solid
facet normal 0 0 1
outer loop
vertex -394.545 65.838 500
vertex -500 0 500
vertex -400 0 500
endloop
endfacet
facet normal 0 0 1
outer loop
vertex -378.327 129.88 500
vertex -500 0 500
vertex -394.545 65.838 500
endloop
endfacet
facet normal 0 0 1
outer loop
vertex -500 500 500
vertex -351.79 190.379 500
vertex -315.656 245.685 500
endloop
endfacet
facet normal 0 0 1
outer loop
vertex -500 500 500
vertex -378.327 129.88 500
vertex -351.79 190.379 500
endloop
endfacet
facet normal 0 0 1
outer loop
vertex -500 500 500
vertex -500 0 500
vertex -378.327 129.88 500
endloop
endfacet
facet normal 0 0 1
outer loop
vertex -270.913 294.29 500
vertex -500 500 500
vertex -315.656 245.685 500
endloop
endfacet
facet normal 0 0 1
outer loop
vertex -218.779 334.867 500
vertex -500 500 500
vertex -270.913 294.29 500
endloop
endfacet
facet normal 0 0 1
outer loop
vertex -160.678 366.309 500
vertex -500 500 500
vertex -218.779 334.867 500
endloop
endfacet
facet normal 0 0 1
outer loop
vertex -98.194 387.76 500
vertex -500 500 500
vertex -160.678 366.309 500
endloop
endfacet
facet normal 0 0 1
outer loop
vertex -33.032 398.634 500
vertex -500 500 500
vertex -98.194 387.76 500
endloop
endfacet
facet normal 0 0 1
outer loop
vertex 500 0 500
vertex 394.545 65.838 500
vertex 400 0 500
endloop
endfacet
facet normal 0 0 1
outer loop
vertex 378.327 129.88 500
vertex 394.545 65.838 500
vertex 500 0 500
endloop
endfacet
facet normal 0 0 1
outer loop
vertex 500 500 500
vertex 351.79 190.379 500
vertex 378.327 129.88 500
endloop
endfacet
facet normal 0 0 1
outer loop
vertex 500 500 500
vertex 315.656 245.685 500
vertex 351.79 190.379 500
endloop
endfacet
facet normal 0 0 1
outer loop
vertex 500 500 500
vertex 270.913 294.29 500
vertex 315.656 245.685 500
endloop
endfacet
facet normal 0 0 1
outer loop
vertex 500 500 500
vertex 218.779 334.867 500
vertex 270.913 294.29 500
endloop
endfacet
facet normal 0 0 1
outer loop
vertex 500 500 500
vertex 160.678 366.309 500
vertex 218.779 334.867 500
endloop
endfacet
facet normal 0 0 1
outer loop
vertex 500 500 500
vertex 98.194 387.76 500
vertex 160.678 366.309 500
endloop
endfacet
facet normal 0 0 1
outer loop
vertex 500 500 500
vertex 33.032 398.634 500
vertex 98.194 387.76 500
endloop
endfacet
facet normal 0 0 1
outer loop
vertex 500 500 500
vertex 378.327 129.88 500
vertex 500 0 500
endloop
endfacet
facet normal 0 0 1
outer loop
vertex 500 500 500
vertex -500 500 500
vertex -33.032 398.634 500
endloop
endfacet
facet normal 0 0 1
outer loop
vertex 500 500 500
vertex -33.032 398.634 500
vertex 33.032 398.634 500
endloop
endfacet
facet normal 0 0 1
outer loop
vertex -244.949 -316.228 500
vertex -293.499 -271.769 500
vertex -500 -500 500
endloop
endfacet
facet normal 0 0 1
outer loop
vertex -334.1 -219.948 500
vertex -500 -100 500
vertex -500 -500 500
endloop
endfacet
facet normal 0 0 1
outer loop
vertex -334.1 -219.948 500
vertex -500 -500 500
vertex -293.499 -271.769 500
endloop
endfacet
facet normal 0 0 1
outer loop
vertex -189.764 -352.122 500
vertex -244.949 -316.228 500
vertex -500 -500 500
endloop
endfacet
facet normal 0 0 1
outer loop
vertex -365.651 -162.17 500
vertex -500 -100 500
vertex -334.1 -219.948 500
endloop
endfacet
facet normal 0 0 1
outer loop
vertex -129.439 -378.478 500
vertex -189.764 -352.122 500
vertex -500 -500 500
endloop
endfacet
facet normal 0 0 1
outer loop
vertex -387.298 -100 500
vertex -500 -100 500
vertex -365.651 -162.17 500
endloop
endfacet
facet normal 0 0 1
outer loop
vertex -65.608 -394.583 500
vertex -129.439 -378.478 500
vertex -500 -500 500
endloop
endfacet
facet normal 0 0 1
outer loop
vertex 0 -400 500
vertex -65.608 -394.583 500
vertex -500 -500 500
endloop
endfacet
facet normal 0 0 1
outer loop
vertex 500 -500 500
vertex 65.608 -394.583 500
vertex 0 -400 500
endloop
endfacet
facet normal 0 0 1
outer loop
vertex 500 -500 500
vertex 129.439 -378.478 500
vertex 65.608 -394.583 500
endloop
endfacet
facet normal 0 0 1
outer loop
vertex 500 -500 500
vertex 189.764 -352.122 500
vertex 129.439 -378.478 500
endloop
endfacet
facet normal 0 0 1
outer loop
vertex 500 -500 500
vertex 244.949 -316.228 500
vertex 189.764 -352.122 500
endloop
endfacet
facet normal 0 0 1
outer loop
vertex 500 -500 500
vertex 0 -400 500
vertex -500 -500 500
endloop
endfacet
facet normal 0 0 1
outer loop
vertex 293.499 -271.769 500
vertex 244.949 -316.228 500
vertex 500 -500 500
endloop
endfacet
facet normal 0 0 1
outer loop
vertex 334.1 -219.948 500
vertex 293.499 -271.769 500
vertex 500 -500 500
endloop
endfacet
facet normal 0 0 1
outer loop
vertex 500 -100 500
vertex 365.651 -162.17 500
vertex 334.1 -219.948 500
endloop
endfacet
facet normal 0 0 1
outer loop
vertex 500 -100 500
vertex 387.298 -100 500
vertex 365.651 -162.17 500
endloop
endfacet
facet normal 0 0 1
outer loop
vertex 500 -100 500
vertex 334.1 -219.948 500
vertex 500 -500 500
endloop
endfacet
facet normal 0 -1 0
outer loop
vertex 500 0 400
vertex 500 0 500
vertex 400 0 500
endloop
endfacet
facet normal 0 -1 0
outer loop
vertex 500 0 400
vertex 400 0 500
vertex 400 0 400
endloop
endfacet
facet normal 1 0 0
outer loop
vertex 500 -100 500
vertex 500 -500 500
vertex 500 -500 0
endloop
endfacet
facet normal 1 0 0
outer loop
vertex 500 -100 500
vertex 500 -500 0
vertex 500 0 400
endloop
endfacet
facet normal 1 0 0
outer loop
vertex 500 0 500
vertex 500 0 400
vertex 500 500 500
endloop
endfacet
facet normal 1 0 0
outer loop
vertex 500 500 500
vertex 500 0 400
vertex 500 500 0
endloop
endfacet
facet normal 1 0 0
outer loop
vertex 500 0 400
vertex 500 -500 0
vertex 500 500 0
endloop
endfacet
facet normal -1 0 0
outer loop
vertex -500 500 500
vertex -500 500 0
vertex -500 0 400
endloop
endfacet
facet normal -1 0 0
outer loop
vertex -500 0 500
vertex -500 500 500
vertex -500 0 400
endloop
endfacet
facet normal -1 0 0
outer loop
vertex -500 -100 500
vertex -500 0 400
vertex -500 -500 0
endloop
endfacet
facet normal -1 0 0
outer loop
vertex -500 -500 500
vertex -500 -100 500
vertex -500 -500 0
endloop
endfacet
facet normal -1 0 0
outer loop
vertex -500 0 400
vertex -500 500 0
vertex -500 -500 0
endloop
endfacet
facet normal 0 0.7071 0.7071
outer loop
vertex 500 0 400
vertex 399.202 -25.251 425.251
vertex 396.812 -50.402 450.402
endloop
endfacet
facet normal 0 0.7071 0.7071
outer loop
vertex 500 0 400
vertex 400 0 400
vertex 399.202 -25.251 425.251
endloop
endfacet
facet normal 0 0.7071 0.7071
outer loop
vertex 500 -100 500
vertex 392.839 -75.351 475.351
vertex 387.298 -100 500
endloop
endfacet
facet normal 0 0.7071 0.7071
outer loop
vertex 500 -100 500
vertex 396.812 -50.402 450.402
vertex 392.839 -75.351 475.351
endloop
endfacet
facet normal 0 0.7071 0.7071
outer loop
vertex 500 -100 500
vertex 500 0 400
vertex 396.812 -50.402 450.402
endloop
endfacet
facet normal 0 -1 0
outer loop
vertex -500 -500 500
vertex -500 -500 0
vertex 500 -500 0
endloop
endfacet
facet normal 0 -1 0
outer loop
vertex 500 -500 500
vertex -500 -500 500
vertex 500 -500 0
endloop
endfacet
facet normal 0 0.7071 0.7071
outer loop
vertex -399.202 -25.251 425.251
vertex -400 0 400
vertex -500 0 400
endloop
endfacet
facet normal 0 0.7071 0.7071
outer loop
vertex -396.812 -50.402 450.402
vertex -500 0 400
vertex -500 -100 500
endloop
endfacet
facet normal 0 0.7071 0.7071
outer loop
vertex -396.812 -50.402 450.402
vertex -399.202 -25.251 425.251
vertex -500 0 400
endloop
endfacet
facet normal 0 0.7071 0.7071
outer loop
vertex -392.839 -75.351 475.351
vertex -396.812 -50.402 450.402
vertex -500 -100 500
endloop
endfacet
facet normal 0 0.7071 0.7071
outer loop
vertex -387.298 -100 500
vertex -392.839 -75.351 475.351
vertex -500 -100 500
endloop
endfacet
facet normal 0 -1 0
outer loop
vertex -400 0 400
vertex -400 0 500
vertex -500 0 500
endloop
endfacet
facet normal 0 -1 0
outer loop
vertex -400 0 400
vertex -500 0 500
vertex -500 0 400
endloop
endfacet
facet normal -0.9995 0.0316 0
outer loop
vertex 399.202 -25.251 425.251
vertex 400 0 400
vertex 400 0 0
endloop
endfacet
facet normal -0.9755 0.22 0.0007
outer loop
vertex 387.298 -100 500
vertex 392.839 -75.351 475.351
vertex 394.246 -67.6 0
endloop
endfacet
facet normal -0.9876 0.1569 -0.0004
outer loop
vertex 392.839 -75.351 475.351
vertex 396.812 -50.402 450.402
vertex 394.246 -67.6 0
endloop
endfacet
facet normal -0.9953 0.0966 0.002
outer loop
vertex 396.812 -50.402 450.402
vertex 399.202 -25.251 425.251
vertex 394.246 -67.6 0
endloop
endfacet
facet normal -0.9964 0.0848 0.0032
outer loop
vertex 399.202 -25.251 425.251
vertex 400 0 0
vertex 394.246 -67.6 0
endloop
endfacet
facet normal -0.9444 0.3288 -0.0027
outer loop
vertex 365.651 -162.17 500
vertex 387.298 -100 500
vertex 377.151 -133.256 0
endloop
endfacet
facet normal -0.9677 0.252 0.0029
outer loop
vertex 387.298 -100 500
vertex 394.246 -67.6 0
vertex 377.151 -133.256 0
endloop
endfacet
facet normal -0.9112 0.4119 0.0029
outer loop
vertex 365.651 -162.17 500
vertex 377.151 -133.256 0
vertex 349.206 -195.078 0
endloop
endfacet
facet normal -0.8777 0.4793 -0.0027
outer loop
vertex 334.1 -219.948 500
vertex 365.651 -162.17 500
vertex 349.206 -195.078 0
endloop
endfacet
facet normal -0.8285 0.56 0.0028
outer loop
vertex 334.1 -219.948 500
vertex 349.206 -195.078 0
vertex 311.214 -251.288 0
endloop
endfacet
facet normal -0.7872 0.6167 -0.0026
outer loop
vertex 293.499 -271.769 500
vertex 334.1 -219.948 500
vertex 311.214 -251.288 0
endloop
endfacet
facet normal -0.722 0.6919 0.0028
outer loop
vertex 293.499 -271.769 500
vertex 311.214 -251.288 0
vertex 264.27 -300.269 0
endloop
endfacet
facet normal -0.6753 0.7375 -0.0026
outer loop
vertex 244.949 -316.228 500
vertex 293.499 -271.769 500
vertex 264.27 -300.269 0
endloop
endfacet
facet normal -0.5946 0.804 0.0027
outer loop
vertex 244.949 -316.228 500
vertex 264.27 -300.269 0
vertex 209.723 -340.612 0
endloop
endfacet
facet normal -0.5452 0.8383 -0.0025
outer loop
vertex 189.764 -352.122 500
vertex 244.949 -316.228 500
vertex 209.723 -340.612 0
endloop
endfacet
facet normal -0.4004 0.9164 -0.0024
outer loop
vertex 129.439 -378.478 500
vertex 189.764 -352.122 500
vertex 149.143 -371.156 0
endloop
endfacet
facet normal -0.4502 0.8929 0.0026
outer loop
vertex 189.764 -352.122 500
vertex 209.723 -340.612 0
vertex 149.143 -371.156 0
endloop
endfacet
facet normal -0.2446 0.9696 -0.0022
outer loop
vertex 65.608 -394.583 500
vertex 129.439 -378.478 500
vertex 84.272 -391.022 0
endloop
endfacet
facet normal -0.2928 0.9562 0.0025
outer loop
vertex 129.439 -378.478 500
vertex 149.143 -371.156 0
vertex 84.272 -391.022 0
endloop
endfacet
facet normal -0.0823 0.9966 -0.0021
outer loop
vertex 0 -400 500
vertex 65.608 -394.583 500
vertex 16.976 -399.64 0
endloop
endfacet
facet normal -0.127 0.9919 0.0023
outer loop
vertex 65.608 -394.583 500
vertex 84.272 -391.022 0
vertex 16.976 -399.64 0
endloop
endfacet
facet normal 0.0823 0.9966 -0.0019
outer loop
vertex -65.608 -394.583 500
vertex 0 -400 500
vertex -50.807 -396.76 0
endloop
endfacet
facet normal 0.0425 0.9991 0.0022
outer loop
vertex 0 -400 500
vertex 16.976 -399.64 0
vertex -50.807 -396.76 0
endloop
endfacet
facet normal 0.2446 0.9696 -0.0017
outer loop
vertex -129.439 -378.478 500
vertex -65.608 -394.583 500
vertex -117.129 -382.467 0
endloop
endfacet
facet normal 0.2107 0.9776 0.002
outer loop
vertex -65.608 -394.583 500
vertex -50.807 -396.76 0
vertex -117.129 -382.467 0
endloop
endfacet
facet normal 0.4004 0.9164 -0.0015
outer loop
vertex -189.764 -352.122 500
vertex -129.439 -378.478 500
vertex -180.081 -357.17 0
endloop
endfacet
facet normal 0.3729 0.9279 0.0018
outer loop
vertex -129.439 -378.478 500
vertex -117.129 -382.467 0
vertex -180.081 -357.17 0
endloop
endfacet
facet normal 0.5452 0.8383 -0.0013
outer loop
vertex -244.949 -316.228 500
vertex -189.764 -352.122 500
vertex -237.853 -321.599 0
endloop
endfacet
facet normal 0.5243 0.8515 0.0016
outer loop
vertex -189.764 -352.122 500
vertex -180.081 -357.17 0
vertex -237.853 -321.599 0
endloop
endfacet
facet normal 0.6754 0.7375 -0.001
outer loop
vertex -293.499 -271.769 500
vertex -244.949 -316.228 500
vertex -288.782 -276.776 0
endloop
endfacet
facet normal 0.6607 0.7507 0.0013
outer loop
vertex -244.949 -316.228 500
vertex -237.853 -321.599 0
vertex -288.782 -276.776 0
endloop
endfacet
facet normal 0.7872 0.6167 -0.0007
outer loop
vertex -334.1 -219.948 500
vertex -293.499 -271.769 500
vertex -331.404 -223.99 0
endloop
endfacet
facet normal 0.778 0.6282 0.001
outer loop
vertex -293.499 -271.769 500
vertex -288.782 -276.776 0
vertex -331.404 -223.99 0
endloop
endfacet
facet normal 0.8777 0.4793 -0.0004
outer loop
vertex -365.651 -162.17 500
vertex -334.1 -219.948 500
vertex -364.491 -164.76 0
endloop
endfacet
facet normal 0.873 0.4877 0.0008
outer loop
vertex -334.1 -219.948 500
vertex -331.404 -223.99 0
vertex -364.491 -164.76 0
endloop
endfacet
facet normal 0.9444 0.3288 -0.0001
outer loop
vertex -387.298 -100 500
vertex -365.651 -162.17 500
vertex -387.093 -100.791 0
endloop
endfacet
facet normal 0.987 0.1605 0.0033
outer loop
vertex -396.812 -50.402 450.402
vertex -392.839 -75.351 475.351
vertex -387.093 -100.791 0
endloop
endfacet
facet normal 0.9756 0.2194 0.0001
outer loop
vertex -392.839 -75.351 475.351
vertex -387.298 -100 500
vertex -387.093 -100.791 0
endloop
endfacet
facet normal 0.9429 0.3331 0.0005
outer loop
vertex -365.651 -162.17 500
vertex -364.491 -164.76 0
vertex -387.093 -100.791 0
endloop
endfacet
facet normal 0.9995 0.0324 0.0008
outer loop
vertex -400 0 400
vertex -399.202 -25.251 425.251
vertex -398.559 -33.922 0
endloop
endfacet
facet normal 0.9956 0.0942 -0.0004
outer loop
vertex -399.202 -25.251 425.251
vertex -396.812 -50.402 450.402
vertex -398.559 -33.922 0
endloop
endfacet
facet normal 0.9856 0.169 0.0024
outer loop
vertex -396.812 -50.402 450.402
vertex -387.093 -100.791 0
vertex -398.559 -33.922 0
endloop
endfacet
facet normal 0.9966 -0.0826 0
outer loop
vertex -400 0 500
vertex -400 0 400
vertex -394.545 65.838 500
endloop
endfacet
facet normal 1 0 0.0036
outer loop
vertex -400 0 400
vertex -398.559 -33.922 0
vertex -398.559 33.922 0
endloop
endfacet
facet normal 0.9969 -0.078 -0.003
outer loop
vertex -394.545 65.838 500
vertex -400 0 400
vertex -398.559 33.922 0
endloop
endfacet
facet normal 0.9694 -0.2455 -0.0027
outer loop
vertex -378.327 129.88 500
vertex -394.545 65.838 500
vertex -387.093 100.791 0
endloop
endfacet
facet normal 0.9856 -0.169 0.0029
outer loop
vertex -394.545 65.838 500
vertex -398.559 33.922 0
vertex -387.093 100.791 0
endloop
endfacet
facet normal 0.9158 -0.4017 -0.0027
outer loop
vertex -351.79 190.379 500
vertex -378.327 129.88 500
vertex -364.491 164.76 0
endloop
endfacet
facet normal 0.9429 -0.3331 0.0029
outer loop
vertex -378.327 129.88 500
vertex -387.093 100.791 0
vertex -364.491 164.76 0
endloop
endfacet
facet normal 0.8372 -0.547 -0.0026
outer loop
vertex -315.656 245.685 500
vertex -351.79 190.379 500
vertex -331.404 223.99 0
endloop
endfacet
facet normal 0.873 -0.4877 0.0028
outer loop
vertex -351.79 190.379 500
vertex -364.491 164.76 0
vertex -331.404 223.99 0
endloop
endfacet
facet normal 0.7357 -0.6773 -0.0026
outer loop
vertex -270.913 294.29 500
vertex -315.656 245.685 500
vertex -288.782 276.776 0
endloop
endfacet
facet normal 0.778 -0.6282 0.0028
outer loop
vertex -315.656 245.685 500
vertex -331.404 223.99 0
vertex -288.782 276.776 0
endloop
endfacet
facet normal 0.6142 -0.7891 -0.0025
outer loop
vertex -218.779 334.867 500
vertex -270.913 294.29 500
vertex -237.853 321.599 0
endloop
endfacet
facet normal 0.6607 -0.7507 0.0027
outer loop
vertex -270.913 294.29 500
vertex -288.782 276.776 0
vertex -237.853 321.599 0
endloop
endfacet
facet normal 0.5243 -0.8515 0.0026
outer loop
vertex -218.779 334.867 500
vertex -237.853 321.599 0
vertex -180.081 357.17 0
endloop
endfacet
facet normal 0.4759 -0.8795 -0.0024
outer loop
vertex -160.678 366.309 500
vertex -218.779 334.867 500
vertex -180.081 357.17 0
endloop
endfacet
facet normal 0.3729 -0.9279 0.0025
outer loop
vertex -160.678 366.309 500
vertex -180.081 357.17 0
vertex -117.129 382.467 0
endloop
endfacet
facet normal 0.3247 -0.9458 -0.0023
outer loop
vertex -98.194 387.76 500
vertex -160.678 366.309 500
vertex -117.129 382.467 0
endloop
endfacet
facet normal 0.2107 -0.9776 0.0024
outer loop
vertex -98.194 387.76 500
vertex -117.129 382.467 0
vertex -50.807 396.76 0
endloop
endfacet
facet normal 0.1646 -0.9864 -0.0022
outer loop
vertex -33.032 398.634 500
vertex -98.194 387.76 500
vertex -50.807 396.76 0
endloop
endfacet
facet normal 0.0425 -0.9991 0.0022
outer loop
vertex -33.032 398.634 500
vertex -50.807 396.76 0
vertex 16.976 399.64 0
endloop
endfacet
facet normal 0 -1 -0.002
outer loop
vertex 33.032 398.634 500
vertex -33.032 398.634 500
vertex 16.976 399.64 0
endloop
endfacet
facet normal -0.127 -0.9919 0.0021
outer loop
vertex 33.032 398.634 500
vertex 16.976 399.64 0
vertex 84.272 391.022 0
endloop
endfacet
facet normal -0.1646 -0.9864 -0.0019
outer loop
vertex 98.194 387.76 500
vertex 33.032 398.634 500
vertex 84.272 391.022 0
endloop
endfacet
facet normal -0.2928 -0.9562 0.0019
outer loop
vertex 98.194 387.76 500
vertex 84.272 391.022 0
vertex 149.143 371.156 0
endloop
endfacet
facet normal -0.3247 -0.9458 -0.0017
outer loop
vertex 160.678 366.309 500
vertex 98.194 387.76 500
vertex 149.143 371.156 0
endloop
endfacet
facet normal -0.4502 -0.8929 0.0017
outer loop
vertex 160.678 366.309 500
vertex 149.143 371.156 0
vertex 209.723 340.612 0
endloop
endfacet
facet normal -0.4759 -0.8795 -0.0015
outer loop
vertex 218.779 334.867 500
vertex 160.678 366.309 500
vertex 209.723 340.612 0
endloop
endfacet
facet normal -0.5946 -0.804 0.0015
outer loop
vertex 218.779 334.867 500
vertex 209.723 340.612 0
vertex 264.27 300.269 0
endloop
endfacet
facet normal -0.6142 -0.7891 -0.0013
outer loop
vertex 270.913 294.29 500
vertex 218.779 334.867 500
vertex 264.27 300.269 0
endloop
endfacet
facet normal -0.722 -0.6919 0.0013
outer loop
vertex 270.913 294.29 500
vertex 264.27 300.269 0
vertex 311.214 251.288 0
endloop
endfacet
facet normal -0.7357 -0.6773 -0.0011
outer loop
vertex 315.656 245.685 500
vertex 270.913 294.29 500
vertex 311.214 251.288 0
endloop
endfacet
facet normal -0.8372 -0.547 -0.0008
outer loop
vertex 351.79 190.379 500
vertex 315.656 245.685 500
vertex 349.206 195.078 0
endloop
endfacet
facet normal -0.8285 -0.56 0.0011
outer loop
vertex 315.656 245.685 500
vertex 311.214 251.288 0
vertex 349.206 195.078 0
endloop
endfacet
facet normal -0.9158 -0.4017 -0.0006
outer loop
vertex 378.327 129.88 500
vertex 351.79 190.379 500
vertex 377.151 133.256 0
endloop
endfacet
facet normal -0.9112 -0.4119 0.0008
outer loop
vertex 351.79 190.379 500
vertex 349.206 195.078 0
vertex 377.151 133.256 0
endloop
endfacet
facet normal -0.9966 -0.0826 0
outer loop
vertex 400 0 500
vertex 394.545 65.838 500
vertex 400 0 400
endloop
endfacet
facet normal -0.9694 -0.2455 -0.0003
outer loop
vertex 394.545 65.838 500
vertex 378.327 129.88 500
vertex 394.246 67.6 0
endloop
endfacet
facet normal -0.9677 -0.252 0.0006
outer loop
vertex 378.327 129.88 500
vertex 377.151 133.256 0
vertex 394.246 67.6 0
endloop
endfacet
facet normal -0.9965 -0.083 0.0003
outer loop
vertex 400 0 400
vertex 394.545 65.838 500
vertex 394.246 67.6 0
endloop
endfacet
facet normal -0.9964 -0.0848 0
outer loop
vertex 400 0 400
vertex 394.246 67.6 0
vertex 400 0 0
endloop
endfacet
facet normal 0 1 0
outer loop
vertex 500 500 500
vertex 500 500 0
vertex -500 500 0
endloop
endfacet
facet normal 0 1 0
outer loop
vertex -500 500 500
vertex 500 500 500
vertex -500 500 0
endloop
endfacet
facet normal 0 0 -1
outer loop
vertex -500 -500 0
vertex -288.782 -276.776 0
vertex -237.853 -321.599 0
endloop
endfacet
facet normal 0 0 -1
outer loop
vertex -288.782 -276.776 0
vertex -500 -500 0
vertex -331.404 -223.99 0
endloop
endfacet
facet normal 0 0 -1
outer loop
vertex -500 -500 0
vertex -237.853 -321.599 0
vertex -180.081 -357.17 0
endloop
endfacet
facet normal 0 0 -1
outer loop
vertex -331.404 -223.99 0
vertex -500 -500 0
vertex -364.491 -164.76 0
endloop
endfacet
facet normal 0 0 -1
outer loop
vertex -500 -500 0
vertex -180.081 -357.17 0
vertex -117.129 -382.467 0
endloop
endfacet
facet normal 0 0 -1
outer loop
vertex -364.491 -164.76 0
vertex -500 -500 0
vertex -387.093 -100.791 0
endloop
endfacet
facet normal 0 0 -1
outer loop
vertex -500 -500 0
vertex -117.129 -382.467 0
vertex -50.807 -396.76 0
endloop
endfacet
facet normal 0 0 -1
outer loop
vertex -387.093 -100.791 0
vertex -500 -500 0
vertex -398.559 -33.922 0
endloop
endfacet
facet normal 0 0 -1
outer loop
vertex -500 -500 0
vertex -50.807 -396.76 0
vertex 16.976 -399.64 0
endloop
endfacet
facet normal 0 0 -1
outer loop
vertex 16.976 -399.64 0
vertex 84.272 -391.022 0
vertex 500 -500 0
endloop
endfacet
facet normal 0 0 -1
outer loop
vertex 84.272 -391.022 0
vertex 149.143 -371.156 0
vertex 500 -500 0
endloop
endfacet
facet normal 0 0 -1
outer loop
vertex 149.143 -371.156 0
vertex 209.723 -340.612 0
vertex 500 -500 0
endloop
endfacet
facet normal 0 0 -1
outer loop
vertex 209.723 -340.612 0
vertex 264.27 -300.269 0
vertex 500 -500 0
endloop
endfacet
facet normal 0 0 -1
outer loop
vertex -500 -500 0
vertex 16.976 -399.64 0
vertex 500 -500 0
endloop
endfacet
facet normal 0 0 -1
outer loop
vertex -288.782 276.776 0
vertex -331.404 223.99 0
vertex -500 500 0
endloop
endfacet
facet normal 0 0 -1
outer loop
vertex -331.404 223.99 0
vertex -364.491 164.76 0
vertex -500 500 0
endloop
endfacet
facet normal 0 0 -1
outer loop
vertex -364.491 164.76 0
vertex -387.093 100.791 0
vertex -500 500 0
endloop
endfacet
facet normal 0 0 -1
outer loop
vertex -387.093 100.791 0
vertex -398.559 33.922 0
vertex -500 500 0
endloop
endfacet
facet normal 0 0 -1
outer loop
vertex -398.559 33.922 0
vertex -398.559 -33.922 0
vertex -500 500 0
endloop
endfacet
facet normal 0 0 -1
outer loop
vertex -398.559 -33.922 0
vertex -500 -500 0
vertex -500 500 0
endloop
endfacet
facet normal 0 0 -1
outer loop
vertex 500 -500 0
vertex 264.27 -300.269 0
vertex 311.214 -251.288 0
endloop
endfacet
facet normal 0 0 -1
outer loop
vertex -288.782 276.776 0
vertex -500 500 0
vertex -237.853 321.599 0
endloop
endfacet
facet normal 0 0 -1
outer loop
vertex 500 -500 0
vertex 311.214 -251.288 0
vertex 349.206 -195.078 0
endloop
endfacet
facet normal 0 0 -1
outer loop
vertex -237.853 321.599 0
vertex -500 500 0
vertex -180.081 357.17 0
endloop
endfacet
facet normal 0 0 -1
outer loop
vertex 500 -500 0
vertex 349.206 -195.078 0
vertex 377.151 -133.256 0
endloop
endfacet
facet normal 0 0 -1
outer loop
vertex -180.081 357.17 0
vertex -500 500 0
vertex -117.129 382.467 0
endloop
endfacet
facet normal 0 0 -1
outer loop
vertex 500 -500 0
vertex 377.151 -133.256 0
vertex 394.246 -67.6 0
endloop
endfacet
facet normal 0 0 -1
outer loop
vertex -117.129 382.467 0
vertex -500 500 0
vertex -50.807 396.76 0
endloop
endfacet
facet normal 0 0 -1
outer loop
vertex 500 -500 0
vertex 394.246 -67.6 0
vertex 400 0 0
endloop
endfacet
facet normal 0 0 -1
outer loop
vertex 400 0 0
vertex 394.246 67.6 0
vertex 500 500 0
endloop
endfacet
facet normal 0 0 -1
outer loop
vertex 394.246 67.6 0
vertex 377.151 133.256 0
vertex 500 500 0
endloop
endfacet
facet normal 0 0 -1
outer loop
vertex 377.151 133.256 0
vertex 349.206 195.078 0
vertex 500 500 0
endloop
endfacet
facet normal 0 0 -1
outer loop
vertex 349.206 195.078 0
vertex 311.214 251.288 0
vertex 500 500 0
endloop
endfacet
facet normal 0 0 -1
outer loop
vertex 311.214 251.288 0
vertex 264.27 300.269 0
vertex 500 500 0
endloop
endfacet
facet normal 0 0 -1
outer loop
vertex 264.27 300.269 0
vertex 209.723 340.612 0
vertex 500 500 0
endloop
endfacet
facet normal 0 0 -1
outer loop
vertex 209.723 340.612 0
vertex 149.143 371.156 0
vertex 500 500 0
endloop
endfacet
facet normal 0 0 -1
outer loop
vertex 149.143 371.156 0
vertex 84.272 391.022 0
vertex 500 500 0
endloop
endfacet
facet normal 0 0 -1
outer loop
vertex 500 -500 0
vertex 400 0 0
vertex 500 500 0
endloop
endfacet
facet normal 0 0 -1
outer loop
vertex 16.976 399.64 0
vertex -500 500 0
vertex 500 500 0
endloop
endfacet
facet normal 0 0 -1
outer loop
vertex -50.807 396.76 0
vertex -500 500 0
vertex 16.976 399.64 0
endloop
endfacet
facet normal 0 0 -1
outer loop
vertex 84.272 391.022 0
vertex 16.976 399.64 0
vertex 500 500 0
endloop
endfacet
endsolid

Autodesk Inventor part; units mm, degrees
ref_plane "YZ Plane" through (0, 0, 0) normal (1, 0, 0) x (0, 1, 0)
ref_plane "XZ Plane" through (0, 0, 0) normal (0, 1, 0) x (-1, 0, 0)
sketch "Náčrt1" plane through (0, 0, 0) normal (0, 0, 1) x (1, 0, 0)
  line L0 (-500, -500) -> (500, -500)
  line L1 (500, -500) -> (500, 500)
  line L2 (500, 500) -> (-500, 500)
  line L3 (-500, 500) -> (-500, -500)
  line L4 (-500, -500) -> (500, 500) construction
  line L5 (500, -500) -> (-500, 500) construction
  circle A0 centre (0, 0) radius 400
  dimension "d0" = 1000
  dimension "d1" = 1000
  dimension "d6" = 800
extrude "Vysunutí1" add sketch "Náčrt1" along normal blind 500
sketch "Náčrt2" plane through (500, -500, 0) normal (1, 0, 0) x (0, 0, -1)
  line L0 (-500, 0) -> (-500, 1000) projected
  line L1 (-500, 500) -> (-400, 500)
  line L2 (-400, 500) -> (-500, 400)
  point P0 (0, 500)
  dimension "d7" = 100
  dimension "d8" = 45
ref_plane "Pracovní rovina1" through (-500, -4173.9622, 0) normal (1, 0, 0) x (0, 1, 0)
extrude "Vysunutí2" cut sketch "Náčrt2" against normal up to surface (1000 mm away)
equation "\"d1\" = d0"
properties part number "B2-Y"
